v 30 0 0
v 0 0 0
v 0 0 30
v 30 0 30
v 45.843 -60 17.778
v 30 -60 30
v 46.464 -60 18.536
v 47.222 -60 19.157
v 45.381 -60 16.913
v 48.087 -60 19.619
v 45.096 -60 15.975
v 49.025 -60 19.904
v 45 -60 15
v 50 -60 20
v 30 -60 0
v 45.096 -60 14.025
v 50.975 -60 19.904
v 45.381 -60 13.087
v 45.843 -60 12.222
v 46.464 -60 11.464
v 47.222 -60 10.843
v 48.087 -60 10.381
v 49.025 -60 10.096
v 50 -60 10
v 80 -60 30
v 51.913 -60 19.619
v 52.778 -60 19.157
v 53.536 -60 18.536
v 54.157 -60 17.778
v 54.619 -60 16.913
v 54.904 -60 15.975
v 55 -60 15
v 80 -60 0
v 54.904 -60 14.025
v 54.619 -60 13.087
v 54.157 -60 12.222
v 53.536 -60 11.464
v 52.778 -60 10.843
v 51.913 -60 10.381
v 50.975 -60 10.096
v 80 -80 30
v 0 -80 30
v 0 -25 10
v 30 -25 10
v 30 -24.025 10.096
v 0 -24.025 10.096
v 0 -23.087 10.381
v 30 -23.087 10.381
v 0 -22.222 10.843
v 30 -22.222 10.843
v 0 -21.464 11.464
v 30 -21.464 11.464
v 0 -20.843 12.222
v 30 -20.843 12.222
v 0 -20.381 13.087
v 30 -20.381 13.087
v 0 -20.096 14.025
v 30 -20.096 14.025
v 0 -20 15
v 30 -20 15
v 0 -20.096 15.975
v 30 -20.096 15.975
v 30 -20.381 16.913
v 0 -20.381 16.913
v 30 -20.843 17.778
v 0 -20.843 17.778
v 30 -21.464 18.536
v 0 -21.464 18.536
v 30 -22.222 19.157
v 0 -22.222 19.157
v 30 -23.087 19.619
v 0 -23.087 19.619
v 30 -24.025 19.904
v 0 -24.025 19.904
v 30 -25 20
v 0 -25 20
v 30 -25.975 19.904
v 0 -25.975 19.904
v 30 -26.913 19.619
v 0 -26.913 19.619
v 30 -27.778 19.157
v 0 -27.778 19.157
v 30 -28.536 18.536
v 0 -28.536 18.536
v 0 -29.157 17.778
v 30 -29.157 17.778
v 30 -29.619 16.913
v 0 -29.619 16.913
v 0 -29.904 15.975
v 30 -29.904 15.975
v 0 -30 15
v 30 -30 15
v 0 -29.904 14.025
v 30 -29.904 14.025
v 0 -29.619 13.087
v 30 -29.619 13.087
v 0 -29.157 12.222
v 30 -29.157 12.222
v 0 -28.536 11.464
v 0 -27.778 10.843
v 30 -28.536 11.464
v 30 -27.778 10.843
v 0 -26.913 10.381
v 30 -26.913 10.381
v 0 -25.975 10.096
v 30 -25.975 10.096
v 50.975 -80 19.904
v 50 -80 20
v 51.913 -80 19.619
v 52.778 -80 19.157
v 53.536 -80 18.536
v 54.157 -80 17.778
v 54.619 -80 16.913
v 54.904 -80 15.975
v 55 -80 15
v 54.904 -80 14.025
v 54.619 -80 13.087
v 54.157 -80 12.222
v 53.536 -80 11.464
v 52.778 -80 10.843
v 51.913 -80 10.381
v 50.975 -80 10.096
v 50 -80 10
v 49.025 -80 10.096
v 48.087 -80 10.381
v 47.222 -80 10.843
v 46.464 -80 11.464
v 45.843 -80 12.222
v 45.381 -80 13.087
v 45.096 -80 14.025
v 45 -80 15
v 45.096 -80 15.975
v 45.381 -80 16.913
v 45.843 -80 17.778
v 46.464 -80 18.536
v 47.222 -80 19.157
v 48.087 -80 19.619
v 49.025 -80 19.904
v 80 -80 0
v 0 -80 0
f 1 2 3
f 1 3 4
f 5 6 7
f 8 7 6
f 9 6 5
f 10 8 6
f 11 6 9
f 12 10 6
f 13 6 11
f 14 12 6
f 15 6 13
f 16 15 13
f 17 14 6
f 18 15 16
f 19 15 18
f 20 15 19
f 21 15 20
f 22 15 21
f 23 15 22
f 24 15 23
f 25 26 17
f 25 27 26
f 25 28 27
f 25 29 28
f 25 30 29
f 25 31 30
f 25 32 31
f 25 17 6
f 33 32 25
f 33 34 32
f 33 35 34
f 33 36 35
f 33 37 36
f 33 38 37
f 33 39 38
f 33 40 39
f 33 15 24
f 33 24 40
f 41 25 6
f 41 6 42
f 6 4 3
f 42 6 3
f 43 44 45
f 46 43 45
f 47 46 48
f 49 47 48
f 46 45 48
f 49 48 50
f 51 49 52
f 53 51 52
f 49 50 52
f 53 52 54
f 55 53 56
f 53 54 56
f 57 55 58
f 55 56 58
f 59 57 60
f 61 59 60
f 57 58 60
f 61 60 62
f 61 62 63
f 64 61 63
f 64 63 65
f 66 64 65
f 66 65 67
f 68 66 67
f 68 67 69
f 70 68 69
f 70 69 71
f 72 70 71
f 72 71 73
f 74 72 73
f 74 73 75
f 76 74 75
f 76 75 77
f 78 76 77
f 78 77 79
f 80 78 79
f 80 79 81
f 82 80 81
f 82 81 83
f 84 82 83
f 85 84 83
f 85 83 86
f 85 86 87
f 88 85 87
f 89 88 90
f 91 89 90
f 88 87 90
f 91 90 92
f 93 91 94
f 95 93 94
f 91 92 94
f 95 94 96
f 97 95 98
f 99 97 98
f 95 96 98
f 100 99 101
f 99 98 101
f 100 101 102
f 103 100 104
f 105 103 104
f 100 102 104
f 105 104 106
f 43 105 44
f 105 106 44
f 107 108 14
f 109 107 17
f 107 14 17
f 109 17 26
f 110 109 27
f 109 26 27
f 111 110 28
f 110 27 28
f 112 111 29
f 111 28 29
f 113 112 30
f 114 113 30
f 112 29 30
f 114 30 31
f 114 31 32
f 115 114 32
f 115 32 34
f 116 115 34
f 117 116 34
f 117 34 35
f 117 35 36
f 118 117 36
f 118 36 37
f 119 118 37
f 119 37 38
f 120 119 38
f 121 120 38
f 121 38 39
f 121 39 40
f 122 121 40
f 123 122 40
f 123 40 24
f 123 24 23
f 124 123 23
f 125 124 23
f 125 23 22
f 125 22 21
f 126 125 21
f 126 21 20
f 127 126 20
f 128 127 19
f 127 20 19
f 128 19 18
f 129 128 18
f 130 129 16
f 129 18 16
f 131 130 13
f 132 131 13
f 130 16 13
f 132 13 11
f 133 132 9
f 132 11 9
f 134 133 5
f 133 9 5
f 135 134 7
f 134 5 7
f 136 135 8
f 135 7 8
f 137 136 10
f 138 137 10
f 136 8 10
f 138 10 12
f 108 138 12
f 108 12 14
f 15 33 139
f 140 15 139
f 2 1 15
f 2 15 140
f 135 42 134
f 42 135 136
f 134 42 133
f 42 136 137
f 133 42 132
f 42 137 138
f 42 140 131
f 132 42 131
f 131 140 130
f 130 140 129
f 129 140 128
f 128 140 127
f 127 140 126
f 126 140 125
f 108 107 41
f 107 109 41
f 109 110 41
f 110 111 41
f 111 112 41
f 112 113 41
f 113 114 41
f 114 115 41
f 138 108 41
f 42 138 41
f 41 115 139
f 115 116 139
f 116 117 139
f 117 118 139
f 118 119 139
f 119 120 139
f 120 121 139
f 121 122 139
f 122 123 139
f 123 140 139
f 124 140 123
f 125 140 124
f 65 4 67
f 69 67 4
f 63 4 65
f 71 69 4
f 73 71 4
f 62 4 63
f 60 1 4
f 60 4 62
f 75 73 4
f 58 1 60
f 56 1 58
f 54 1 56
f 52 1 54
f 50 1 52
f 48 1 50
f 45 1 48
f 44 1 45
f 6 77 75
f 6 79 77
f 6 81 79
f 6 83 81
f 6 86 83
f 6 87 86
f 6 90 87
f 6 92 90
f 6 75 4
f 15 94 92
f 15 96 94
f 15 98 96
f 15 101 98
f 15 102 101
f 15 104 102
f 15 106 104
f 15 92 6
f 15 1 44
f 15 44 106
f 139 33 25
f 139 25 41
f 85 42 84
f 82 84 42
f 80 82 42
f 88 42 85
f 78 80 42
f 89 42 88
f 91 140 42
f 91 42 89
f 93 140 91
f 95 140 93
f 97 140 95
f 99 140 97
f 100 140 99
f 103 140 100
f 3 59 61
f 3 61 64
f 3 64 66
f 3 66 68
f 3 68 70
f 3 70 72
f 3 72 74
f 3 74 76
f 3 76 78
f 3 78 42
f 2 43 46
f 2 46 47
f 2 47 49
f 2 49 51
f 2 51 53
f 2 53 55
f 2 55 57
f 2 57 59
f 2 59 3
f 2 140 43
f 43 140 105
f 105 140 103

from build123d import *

# Parameters (mm, degrees)
BOSS_EXTRUDE1_DEPTH = 30
SKETCH2_R           = 5
CUT_EXTRUDE2_DEPTH  = 40
SKETCH4_R           = 5
CUT_EXTRUDE3_DEPTH  = 40


with BuildPart() as part:
    # Sketch1 → Boss-Extrude1 (new body)
    with BuildSketch(Plane.XY):
        Polygon((0, 0), (30, 0), (30, -60), (80, -60), (80, -80), (30, -80), (0, -80), align=None)
    extrude(amount=BOSS_EXTRUDE1_DEPTH)

    # Sketch2 → Cut-Extrude2 (cut)
    with BuildSketch(Plane(origin=(30, 0, 0), x_dir=(0, 0, -1), z_dir=(1, 0, 0))):
        with Locations((-15, -25)):
            Circle(SKETCH2_R)
    extrude(amount=-CUT_EXTRUDE2_DEPTH, mode=Mode.SUBTRACT)

    # Sketch4 → Cut-Extrude3 (cut)
    with BuildSketch(Plane(origin=(0, -60, 0), x_dir=(1, 0, 0), z_dir=(0, 1, 0))):
        with Locations(Location((50, -15, 0), (0, 0, 270))):
            Circle(SKETCH4_R)
    extrude(amount=-CUT_EXTRUDE3_DEPTH, mode=Mode.SUBTRACT)


solid = part.part
